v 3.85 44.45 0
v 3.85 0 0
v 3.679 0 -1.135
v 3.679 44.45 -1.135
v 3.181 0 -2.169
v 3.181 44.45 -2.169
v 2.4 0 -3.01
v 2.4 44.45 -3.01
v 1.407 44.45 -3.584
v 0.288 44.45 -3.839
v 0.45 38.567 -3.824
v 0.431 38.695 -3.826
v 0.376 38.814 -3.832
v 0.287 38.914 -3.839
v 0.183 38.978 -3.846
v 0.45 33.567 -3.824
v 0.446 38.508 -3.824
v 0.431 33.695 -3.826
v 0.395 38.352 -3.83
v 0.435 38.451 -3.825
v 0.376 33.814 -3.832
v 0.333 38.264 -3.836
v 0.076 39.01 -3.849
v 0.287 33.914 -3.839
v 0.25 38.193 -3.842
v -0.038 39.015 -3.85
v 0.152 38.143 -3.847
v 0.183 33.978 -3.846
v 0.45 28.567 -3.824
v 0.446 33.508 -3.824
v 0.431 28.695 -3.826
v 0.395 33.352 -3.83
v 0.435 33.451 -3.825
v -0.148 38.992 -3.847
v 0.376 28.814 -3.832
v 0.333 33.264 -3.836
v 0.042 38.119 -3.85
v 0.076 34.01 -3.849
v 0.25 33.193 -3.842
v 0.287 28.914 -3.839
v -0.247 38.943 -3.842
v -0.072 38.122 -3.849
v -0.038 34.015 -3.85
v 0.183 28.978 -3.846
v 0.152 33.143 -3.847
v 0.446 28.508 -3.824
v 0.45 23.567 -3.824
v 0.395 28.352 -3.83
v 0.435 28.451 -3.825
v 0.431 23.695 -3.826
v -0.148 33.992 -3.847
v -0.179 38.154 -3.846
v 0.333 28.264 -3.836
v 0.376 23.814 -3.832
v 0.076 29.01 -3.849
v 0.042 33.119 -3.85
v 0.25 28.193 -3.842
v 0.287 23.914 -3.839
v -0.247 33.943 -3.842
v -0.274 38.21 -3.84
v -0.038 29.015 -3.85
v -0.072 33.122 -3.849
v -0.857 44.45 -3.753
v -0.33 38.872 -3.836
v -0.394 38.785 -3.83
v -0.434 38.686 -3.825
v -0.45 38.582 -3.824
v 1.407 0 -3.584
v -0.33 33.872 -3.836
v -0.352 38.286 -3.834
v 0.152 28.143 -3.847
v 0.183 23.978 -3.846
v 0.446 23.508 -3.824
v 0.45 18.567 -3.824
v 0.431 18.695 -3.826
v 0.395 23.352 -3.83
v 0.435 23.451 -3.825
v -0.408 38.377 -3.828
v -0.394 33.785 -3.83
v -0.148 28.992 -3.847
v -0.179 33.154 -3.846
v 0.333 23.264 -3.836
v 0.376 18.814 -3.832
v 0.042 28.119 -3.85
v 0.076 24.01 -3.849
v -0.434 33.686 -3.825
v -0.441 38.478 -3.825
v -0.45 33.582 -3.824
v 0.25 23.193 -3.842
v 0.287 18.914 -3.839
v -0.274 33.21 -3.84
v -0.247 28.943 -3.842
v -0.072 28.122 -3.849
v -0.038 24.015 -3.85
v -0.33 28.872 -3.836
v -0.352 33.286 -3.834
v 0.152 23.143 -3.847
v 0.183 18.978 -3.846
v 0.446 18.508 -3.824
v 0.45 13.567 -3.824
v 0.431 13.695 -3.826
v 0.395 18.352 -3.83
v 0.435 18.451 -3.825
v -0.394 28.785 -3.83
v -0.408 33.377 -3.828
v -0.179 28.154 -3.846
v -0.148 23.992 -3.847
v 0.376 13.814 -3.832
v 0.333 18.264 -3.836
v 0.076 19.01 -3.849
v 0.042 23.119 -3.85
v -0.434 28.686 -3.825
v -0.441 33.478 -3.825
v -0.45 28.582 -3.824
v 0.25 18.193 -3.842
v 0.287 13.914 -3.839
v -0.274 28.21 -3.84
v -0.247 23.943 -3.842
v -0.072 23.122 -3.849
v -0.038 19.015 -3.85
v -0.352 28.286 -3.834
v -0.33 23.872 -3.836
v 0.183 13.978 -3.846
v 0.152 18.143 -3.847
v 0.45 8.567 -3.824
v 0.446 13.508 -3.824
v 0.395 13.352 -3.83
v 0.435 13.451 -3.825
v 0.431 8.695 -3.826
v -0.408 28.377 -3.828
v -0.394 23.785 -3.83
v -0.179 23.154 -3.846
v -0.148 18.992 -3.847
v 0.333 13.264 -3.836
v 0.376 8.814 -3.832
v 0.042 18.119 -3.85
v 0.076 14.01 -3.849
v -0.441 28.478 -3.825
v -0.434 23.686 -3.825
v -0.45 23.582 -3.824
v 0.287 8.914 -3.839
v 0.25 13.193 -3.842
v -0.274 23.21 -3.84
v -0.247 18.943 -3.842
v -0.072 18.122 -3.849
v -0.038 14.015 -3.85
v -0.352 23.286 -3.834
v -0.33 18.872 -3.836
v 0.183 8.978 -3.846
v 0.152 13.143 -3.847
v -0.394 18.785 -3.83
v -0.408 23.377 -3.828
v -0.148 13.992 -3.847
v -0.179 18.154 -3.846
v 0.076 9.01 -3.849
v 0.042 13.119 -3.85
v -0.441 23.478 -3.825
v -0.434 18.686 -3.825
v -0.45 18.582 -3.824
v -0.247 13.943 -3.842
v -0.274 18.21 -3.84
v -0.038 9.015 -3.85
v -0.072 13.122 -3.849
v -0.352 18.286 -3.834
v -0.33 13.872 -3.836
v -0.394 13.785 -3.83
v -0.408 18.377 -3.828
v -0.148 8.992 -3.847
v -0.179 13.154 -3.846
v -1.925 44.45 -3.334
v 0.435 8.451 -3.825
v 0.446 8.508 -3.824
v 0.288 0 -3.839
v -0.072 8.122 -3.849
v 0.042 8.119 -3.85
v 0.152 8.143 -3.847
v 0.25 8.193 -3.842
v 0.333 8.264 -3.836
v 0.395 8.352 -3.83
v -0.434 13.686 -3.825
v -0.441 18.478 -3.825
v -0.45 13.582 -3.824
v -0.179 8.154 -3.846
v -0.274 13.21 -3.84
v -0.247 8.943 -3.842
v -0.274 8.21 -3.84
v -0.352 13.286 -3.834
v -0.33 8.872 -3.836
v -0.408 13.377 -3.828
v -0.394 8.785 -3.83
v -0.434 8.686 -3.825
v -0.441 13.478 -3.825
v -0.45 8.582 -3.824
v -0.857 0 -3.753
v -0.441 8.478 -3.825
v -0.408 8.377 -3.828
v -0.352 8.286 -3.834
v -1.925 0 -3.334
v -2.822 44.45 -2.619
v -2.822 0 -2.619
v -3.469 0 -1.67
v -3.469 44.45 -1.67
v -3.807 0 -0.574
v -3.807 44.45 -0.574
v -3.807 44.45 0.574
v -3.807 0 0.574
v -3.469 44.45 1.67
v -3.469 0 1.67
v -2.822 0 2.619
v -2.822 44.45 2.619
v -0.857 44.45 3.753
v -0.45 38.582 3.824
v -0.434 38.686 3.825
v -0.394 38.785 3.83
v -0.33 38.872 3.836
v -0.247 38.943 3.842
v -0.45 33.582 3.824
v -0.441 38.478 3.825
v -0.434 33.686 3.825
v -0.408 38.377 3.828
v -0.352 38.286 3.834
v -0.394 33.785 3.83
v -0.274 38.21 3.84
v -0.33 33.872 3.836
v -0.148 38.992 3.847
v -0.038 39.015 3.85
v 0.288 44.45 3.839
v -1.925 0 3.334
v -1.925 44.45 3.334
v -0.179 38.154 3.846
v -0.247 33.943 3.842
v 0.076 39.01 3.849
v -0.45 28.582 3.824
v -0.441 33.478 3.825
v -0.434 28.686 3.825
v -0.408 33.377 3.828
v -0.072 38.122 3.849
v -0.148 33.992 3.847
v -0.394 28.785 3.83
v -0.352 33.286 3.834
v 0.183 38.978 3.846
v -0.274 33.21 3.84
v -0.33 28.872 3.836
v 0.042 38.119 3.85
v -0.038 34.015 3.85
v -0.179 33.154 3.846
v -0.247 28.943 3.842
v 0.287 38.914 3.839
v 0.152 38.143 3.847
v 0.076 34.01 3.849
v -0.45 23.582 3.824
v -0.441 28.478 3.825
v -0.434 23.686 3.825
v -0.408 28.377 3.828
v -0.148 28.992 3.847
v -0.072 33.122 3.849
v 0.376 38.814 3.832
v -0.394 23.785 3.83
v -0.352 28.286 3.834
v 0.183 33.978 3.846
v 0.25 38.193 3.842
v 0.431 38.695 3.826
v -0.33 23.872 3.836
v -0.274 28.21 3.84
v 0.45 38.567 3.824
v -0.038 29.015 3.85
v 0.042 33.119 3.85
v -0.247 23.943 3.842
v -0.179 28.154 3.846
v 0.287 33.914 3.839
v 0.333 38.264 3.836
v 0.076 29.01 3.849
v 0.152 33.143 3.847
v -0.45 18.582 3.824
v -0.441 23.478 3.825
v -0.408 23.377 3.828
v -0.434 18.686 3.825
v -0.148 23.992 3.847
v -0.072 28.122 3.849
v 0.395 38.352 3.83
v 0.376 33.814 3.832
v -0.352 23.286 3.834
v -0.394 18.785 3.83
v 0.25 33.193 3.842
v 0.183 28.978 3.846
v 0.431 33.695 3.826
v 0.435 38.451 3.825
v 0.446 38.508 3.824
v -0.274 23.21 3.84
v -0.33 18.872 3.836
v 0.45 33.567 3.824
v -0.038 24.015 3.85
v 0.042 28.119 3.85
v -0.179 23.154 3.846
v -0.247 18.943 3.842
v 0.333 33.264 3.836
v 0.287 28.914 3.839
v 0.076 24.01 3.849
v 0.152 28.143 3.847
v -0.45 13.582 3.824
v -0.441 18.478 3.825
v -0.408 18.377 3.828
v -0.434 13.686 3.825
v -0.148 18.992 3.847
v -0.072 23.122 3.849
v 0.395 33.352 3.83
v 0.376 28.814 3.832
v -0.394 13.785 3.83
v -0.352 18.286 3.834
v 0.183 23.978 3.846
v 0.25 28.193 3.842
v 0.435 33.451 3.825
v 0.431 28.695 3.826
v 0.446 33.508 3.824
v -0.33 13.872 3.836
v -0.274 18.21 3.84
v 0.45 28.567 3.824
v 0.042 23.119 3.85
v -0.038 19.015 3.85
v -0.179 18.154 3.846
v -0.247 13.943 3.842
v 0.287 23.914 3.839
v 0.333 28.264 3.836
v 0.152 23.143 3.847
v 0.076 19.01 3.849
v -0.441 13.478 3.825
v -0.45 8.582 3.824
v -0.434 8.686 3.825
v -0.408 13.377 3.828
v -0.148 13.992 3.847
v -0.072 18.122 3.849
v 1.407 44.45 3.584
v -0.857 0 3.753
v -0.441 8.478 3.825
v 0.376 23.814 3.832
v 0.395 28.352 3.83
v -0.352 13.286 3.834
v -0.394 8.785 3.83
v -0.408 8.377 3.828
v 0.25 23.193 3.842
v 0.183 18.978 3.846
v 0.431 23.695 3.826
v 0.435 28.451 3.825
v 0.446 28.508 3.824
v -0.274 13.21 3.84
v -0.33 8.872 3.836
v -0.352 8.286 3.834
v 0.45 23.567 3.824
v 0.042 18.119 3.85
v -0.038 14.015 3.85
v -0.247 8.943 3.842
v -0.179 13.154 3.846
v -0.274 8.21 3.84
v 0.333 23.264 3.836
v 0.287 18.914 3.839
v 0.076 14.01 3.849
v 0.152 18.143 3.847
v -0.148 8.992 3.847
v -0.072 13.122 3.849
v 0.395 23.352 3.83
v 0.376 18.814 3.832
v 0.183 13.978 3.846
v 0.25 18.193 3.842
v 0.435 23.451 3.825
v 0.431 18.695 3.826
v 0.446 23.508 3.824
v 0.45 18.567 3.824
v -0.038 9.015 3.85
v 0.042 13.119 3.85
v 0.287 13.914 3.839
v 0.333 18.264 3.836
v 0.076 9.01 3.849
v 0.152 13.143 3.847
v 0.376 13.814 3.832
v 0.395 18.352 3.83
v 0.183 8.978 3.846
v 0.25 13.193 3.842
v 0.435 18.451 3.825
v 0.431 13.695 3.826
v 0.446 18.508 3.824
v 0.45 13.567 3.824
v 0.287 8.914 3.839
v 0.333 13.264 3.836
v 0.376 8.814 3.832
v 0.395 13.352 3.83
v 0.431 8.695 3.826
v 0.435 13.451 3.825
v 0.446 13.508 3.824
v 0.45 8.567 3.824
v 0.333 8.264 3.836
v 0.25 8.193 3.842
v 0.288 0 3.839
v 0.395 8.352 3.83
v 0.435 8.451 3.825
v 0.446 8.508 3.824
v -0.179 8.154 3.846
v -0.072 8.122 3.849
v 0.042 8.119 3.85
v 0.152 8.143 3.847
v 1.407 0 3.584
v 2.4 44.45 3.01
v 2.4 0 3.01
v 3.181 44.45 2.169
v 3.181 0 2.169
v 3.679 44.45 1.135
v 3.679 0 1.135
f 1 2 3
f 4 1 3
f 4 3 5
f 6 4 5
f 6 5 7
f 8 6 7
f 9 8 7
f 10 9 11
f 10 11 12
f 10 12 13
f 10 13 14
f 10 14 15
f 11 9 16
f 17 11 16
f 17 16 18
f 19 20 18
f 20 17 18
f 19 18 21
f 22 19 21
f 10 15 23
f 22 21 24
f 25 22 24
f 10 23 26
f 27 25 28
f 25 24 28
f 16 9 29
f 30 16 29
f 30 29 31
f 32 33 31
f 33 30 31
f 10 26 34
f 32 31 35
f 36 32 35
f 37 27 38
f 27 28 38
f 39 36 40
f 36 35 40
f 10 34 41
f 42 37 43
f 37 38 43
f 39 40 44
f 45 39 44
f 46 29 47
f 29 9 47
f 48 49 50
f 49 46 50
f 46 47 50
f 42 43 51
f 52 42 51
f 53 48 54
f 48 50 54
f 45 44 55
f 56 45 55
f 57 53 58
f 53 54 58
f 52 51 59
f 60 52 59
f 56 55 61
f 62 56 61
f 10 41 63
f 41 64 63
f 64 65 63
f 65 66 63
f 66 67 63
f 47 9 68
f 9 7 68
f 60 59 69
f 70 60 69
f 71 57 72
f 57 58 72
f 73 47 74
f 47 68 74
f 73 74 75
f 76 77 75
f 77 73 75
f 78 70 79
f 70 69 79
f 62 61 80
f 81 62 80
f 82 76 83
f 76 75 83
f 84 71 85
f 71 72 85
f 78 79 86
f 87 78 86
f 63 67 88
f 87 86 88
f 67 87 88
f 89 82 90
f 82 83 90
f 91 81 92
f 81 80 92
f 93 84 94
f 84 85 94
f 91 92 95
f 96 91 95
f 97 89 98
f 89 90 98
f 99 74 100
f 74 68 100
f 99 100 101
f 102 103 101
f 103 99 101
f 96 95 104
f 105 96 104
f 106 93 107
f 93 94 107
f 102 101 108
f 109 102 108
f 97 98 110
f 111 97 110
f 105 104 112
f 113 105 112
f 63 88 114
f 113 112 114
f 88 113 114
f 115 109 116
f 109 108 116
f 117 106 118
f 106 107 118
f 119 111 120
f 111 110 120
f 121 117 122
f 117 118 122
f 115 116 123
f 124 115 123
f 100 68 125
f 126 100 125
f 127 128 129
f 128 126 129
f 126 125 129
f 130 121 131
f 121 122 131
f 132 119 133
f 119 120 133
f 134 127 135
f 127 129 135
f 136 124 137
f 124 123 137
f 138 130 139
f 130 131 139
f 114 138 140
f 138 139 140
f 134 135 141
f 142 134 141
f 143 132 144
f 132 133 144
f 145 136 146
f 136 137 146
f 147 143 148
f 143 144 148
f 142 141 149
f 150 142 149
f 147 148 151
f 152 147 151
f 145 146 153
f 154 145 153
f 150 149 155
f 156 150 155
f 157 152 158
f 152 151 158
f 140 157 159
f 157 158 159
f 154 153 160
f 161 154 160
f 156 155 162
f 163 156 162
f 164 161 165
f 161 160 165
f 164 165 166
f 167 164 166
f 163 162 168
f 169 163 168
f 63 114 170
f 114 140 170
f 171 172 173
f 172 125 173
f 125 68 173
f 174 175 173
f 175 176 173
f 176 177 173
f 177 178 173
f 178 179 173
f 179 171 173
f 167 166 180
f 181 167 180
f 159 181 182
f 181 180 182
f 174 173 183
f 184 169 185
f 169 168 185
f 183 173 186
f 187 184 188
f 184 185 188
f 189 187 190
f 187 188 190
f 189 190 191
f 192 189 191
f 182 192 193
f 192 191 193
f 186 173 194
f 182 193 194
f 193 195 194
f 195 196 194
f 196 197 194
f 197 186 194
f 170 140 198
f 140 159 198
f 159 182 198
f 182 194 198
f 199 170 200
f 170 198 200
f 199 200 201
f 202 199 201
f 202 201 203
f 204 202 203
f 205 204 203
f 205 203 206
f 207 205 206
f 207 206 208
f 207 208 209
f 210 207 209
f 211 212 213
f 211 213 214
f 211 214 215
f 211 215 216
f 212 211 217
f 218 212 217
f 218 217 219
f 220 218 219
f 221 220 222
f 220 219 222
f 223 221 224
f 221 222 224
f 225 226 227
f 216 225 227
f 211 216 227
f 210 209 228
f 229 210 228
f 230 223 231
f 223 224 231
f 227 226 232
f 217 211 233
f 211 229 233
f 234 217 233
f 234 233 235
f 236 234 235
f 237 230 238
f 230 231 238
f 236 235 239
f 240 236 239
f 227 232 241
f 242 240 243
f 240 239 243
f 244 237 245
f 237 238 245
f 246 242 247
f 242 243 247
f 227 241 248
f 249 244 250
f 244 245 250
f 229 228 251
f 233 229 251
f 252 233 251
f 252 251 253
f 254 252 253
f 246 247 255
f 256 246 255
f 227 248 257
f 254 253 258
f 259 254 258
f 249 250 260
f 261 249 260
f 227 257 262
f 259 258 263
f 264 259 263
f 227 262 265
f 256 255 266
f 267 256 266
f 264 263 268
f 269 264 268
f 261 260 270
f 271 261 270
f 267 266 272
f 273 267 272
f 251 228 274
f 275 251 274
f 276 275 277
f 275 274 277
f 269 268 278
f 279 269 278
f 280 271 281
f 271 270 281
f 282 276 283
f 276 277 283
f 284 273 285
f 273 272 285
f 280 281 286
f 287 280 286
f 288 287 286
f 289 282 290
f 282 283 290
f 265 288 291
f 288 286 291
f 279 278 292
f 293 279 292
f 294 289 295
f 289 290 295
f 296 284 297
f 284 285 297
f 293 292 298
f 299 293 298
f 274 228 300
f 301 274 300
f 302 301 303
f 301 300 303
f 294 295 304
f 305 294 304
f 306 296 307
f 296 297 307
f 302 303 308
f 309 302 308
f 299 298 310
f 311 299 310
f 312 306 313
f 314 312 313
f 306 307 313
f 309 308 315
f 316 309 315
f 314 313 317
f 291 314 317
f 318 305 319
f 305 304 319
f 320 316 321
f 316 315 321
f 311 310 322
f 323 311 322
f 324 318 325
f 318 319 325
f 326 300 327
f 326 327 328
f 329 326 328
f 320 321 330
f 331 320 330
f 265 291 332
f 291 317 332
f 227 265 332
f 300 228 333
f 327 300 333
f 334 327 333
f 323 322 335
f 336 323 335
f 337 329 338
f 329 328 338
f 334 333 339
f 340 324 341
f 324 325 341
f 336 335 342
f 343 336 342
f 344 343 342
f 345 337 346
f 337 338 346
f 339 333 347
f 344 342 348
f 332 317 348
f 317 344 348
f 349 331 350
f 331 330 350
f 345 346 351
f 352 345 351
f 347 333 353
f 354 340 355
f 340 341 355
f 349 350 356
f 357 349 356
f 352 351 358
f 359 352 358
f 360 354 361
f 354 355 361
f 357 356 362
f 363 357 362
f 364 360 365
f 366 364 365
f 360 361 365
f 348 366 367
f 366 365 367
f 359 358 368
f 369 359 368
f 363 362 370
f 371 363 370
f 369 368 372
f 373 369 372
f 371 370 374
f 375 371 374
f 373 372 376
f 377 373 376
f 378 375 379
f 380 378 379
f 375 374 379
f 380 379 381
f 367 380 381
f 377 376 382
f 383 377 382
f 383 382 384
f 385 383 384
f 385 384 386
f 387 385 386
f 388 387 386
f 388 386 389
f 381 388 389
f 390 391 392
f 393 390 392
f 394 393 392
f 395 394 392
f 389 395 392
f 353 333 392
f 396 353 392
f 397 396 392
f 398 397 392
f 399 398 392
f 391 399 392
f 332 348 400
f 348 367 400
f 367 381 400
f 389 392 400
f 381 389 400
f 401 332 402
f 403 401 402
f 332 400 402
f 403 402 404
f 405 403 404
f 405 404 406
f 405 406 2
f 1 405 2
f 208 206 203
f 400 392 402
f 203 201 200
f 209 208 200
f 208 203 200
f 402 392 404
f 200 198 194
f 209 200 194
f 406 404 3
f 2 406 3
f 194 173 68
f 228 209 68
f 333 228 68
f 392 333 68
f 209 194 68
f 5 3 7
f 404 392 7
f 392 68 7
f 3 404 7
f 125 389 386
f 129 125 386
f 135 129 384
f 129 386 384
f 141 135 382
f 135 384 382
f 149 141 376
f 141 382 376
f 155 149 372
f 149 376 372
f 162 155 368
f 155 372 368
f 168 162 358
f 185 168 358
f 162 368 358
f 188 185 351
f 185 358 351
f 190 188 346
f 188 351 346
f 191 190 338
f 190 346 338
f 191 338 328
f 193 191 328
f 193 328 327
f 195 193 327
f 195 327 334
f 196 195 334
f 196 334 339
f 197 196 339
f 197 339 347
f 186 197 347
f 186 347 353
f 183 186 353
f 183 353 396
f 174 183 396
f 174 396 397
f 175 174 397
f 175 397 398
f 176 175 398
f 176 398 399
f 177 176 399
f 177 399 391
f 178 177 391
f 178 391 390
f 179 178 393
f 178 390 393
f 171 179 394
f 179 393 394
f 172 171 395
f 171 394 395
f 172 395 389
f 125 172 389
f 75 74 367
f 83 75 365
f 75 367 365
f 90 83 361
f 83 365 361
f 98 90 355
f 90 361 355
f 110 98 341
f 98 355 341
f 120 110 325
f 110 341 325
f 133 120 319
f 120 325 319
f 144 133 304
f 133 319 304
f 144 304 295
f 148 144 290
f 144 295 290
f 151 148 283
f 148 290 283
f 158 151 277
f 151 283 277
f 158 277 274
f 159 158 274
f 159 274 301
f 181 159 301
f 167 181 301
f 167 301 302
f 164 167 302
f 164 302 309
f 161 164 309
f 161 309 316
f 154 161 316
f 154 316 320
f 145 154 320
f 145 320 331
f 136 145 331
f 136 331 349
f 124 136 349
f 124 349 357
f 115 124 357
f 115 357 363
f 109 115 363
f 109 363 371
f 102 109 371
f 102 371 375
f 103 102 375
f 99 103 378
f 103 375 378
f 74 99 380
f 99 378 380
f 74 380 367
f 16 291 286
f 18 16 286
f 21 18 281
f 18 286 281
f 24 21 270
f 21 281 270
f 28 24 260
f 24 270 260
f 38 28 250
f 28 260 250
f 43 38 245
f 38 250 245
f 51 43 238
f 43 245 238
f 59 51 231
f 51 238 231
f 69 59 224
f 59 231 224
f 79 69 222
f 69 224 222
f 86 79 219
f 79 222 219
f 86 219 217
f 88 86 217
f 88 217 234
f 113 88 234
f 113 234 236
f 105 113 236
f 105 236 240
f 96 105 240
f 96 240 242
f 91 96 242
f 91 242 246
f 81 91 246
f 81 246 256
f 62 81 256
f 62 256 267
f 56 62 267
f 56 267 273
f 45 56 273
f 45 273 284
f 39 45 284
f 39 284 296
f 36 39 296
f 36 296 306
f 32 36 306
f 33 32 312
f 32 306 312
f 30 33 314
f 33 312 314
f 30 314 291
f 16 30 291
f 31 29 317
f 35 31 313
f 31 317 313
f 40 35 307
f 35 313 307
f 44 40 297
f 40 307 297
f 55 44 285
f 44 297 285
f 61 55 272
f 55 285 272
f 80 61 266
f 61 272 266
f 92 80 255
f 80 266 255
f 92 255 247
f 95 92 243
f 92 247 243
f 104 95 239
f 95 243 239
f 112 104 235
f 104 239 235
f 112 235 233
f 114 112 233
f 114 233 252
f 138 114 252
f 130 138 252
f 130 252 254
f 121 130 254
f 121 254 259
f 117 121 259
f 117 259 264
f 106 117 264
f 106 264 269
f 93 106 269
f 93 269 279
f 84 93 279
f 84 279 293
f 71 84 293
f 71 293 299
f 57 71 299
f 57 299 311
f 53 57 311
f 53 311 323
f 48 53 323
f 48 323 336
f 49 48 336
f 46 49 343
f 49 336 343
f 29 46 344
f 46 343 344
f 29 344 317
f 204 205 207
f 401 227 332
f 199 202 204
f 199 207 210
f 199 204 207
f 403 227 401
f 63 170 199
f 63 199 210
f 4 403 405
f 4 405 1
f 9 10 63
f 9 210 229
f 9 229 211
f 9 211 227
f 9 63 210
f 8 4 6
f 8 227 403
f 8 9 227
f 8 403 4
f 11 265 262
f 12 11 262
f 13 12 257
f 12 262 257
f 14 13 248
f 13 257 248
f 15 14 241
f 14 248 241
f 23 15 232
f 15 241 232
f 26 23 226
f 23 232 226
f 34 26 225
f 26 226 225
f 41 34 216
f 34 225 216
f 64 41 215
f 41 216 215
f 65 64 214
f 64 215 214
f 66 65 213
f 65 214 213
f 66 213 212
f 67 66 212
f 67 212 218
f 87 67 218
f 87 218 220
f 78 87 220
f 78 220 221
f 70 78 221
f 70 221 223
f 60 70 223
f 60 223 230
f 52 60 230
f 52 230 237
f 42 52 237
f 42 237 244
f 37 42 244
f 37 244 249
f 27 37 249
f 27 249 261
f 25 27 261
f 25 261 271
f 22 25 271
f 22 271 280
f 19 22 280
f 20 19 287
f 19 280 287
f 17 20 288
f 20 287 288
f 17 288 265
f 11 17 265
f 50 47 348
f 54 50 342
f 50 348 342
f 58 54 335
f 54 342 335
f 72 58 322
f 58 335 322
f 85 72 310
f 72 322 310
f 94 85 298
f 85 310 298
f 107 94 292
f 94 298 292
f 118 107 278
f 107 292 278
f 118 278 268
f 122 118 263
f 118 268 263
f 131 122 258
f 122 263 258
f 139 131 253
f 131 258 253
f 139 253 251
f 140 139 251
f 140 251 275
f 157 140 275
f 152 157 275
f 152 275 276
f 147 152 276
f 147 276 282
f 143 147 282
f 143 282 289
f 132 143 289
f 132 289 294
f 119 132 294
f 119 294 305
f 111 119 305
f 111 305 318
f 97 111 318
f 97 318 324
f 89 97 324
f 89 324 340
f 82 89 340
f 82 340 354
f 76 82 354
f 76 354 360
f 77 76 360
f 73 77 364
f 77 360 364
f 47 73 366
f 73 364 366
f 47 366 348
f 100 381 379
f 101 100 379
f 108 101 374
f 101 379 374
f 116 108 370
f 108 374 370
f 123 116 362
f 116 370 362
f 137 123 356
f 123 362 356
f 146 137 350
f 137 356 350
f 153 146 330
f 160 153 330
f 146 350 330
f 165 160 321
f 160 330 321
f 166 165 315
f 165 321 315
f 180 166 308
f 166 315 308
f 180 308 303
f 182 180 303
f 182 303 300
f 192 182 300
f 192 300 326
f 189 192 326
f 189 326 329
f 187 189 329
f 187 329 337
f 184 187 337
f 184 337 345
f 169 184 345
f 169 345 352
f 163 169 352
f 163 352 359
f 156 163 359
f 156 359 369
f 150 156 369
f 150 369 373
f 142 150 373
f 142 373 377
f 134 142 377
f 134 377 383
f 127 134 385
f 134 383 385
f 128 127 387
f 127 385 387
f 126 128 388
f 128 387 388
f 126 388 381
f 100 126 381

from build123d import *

# Parameters (mm, degrees)
SKETCH1_R           = 3.850000047
BOSS_EXTRUDE1_DEPTH = 44.45
SKETCH4_R           = 0.45
CUT_EXTRUDE1_DEPTH  = 10.16
LPATTERN1_COUNT     = 7
LPATTERN1_PITCH     = 5


with BuildPart() as part:
    # Sketch1 → Boss-Extrude1 (new body)
    with BuildSketch(Plane(origin=(0, 0, 0), x_dir=(1, 0, 0), z_dir=(0, 1, 0))):
        Circle(SKETCH1_R)
    extrude(amount=BOSS_EXTRUDE1_DEPTH)

    # Sketch4 → Cut-Extrude1 (cut)
    with BuildSketch(Plane.XY.offset(5.08)):
        with Locations((0, 8.566631878)):
            Circle(SKETCH4_R)
    cut_extrude1 = extrude(amount=-CUT_EXTRUDE1_DEPTH, mode=Mode.SUBTRACT)

    # LPattern1: Cut-Extrude1 ×7
    with Locations(*[(0, i * LPATTERN1_PITCH, 0) for i in range(1, LPATTERN1_COUNT)]):
        add(cut_extrude1, mode=Mode.SUBTRACT)


solid = part.part
